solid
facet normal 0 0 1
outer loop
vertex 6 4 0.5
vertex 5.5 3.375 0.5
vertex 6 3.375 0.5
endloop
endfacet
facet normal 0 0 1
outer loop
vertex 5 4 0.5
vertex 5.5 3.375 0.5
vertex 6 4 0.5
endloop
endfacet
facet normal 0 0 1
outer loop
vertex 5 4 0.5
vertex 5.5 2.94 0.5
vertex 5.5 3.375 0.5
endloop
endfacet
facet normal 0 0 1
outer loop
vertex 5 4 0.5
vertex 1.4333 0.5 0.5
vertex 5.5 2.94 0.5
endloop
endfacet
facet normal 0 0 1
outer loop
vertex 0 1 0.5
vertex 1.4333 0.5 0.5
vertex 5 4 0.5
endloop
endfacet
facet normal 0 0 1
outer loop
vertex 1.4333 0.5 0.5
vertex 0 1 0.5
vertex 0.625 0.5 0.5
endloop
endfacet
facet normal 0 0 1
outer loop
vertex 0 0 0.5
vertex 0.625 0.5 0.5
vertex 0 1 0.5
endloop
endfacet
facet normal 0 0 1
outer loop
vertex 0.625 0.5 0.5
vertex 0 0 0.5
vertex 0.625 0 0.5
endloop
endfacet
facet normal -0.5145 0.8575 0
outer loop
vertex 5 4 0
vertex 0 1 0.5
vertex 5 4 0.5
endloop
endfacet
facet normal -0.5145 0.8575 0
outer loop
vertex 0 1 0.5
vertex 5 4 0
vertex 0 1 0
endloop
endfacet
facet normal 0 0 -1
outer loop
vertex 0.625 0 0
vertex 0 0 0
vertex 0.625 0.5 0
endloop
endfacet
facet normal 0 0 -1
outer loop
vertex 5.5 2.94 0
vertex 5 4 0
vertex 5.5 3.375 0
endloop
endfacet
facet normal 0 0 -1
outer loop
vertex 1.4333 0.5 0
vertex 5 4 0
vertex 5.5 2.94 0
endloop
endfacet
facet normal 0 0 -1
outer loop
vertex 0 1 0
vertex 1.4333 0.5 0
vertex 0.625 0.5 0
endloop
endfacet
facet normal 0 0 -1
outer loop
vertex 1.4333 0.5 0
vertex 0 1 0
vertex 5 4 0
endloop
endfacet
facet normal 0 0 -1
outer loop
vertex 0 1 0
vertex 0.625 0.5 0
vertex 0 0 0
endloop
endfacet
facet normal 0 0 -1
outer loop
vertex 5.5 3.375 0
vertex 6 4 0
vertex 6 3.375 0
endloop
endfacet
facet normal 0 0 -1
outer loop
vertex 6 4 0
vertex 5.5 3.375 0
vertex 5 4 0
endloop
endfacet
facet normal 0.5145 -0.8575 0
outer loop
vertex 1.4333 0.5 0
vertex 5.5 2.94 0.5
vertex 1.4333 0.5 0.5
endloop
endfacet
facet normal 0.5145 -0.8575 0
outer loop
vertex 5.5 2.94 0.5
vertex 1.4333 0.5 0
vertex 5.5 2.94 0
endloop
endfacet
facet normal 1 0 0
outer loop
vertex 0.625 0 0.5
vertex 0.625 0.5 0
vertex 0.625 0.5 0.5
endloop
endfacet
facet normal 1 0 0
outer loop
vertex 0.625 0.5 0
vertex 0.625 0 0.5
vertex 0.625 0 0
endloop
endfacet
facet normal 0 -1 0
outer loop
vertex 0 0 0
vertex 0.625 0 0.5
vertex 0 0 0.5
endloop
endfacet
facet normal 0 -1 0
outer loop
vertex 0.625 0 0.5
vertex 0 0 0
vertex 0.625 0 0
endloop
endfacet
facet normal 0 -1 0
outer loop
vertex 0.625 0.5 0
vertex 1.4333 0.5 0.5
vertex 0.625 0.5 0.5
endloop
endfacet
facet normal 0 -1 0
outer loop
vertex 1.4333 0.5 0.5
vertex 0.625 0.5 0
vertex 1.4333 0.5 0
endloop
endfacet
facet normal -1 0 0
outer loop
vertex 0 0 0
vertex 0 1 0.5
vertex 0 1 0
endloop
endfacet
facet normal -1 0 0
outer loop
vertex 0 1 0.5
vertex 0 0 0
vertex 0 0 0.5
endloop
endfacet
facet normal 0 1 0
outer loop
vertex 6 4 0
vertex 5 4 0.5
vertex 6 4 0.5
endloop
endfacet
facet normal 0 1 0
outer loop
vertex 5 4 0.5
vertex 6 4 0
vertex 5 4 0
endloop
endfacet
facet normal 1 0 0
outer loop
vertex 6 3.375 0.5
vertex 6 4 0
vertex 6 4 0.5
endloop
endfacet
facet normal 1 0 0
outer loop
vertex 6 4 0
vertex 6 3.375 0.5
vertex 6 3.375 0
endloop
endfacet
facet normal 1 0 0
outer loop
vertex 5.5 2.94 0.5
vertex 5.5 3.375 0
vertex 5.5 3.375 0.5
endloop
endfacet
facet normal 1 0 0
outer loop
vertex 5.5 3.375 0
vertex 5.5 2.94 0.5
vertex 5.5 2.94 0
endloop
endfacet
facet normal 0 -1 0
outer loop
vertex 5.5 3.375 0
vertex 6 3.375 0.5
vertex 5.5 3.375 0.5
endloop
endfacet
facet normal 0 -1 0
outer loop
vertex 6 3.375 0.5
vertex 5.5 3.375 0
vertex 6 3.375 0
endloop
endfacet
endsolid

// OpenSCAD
// file: modus.scad
//Corner Joint - allows the sides of two parts to create inlayed corner. Aids with welding.
//need to verify module math is the same throughout all parts.

module cornerjoint(Z,L,H,EndGap,PadL,PadH,CJangle,CJcenter){
    //change so that H = Z of inlayed part (usually 0.5)
    //add center and angle in degrees option, orgin far side of cut out area

     if((CJangle==0)&&(CJcenter==0))
      {    
        translate([0,0,0])
        rotate([0,0,CJangle])
        difference(){
        cube([L,H+PadH,Z]);
        translate([EndGap,H,0])
        cube([PadL,PadH,Z]);
        translate([L-EndGap-PadL,H,0])
        cube([PadL,PadH,Z]);}
      }    
else if((CJangle==90)&&(CJcenter==0))
      {    
        translate([H+PadH,0,0])
        rotate([0,0,CJangle])
        difference(){
        cube([L,H+PadH,Z]);
        translate([EndGap,H,0])
        cube([PadL,PadH,Z]);
        translate([L-EndGap-PadL,H,0])
        cube([PadL,PadH,Z]);}
      }
else if((CJangle==180)&&(CJcenter==0))       
      {    
        translate([L,H+PadH,0])
        rotate([0,0,CJangle])
        difference(){
        cube([L,H+PadH,Z]);
        translate([EndGap,H,0])
        cube([PadL,PadH,Z]);
        translate([L-EndGap-PadL,H,0])
        cube([PadL,PadH,Z]);}
      }
else if((CJangle==270)&&(CJcenter==0))
      {    
        translate([0,L,0])
        rotate([0,0,CJangle])
        difference(){
        cube([L,H+PadH,Z]);
        translate([EndGap,H,0])
        cube([PadL,PadH,Z]);
        translate([L-EndGap-PadL,H,0])
        cube([PadL,PadH,Z]);}
      }  
      
//centered     
   
else if((CJangle==0)&&(CJcenter==1))
      {    
        translate([-L/2,0,0])
        rotate([0,0,CJangle])
        difference(){
        cube([L,H+PadH,Z]);
        translate([EndGap,H,0])
        cube([PadL,PadH,Z]);
        translate([L-EndGap-PadL,H,0])
        cube([PadL,PadH,Z]);}
      }  
else if((CJangle==90)&&(CJcenter==1))
      {    
        translate([0,-L/2,0])
        rotate([0,0,CJangle])
        difference(){
        cube([L,H+PadH,Z]);
        translate([EndGap,H,0])
        cube([PadL,PadH,Z]);
        translate([L-EndGap-PadL,H,0])
        cube([PadL,PadH,Z]);}
      }
else if((CJangle==180)&&(CJcenter==1))       
      {    
        translate([L/2,0,0])
        rotate([0,0,CJangle])
        difference(){
        cube([L,H+PadH,Z]);
        translate([EndGap,H,0])
        cube([PadL,PadH,Z]);
        translate([L-EndGap-PadL,H,0])
        cube([PadL,PadH,Z]);}
      }
else if((CJangle==270)&&(CJcenter==1))
      {    
        translate([0,L/2,0])
        rotate([0,0,CJangle])
        difference(){
        cube([L,H+PadH,Z]);
        translate([EndGap,H,0])
        cube([PadL,PadH,Z]);
        translate([L-EndGap-PadL,H,0])
        cube([PadL,PadH,Z]);}
      }
} //end cornerjoint module

//Tab Insert - used to cut a hole for an abutting part to insert into. Typically aids with welding the two parts.
module tabinsert(X,Y,Z,dGap,cGap,c1,c2,c3,c4,c5,c6,c7,c8,center){
    translate([-dGap-(center*(X/2)),-dGap-(center*(Y/2)),0]){
        //main cut
        cube([X+(dGap*2),Y+(dGap*2),Z]);
        //corner c1c2
        translate([-cGap,(Y+(dGap*2))-c1+cGap,0])
            {
        cube([c2,c1,Z]);}
       //corner c3c4
       translate([(X+(dGap*2))-c3+cGap,(Y+(dGap*2))-c4+cGap,0]){
           cube([c3,c4,Z]);
       }
       //corner c5c6
       translate([(X+(dGap*2))-c6+cGap,-cGap,0])
      {
          cube([c6,c5,Z]);
      }
       
       //corner c7c8 
       translate([-cGap,-cGap,0]){
           cube([c7,c8,Z]);
       }
    
    } //end center translate
} //end tabinsert module
 
// file: vars.scad
brickW=6; 
brickL=12;
brickCH=6;

$fn=8; //defines resolution of circles. 8 is okay for review. 100  or greater should be used for for final dxf export.

dZstandard=0.5; //thickness of steel to be cut for drawer parts
fZstandard=0.5;
aZstandard=0.5; //thickness of steel to be cut for arm parts

fBOLTHOLEstandardD=1; //standard bolts used on frame
sliderodholeOD=1.2; 

dGap=0.03125; //gap between a hole cut's edge and the part sitting within the hole. //D3 appears to use 0.3125, is this in error?

//all parts set to standard thickness below
//off standard preferences can be defined below

//drawer
drawergap=0.0283;  //extra room for drawer to slide in the space between f1 and f4
drawerHgap=0.1884;  //total extra space from drawer sides to frame walls. sum of both sides.

d1z=dZstandard;
d2z=dZstandard;
d3z=dZstandard;
d4z=dZstandard;
d5z=dZstandard;
d6z=dZstandard;
d5z=dZstandard;
d7z=dZstandard;
d8z=dZstandard;
d9z=dZstandard;

//frame
f1x=24.2;
f1y=6;
f1z=0.5;


f2y=3.5;
f2z=fZstandard;

f3x=f1x;
f3y=3.5;
f3z=fZstandard;

f4y=11;
f4z=fZstandard;

f5y=3.5;
f5z=fZstandard;

f6y=8;
f6z=fZstandard;

f8y=brickW;
f8z=fZstandard;
f8boltD=1;

f9y=4.5;
f9x=43.5;  //set based on MAINcylinder
f9z=fZstandard;

f8x=f9x;

f11x=1.25;
f11z=fZstandard;

f13z=fZstandard;

//arms

a1x=4;
a1y=72; //calculate based on drawer cylinder
a1z=aZstandard;

a2x=6;
a2y=72;  //calculate based on drawer cylinder
a2z=aZstandard;

a4z=aZstandard;
a6z=aZstandard;

//
//Input your main cylinder's dimenions here
//
cylinderMAINminC2E=0; //main hydraulic cylinder's distance from center of mounting hole to the end of the shaft when fully compressed.
cylinderMAINmaxC2E=0; //main hydraulic cylinder's distance from center of mounting hole to the end of the shaft when fully extended.

//
//Input your drawer cylinder's dimenions here
//
cylinderDRAWERbodyH=3; //measured when in position, largest length from top to bottom of cylinder
cylinderDRAWERminC2C=0; //drawer's hydraulic cylinder's distance from the center of one mounting hole to the center of the other when fully compressed.
cylinderDRAWERmaxC2C=0; ///drawer's hydraulic cylinder's distance from the center of one mounting hole to the center of the other when fully extended.
cylinderDRAWERrodclevisW=2.5; //width of cylinders' clevis on end of rod
cylinderDRAWERrodclevisID=1;
cylinderDRAWERrodclevisOD=2;
cylinderDRAWERrearclevisW=2.5; //width of mounting clevis cylinder body
cylinderDRAWERrearclevisID=1;
cylinderDRAWERrearclevisOD=2;
cylinderDRAWERrearclevisClearance=3; //usable space around rear clevis pin (in diameter). be aware of hyraulic fittings.

//the following variables are calculated in order of dependence on preceding variables
d3x=brickL+(d2z*2);
d3y=brickCH-d1z;
d4x=brickW+d3z+d3z;
d4y=brickCH-d1z;
d5x=brickL+(d2z*2);
d5y=brickW;
d6x=brickL+(d2z*2);
d6y=brickCH;
d7x=cylinderDRAWERrearclevisClearance;
d7y=a4z+d8z+cylinderDRAWERbodyH;
d9x=cylinderDRAWERbodyH+d6z;
d9y=cylinderDRAWERbodyH+d8z;
d8x=brickL+(d2z*2);
d8y=max(5,(d9x-d6z));   //need to review fundamentals, 5 minimun unless d9 gets larger than d8
d1x=18.5;   //need to come up with a formula
d1y=18;     //need to come up with a formula
d2x=d8y+d6z+brickW+d3z+d5y+d3z;
d2y=brickCH;

f11y=f8y;
f6x=brickL+(d2z*2)+(f9y*2)+drawerHgap;
f8x=43.5;  //need to define based on MAINcylinder inputs


f2x=brickL+(d2z*2)+drawerHgap+(f9y*2)-(1.4*2);  //distance between large cut outs in f9

f5x=brickL+(d2z*2)+drawerHgap+(f9y*2)+(a1x*2); //distance between outer edges of each A1

f4x=f5x-0.5;   //same as f5 but minus 0.25 on each side to give a little overhang
// main file
include <vars.scad>;
use <modus.scad>;

a6p();

module a6p(){
    
    X=a2x;
    Y=a1x;
    Zx=a2z;
    Zy=a1z;
    
    W=min(((1)/cos((atan((Y-1)/(X-1))))),((1)/sin((atan((Y-1)/(X-1)))))); 
    //trying to make some overhang for insert to butt up against. not perfect but working
    //trying for 0.5, but not getting there exactly
    
difference(){

union(){

translate([-1/tan(atan((Y-1)/(X-1))),0,0])
rotate([0,0,atan((Y-1)/(X-1))])
translate([0,-W,0])
#cube([50,W,a6z]);
    
cube([0.625,Zx,a6z]);
    
translate([X-Zy,Y-0.625,0])
cube([Zy,0.625,a6z]);
} //end union - start difference
        
translate([0.625,0,0])    
cube([100,Zx,a6z]);

translate([-100,-99,0])    
cube([100,100,a6z]);

translate([0,-100,0])    
cube([100,100,a6z]);

translate([0,Y,0])
cube([100,100,a6z]);

translate([X,0,0])
cube([100,100,a6z]);

translate([X-Zy,Y-0.625-100,0])
cube([Zy,100,a6z]);



    } //end difference
    
}  //end a6p module
